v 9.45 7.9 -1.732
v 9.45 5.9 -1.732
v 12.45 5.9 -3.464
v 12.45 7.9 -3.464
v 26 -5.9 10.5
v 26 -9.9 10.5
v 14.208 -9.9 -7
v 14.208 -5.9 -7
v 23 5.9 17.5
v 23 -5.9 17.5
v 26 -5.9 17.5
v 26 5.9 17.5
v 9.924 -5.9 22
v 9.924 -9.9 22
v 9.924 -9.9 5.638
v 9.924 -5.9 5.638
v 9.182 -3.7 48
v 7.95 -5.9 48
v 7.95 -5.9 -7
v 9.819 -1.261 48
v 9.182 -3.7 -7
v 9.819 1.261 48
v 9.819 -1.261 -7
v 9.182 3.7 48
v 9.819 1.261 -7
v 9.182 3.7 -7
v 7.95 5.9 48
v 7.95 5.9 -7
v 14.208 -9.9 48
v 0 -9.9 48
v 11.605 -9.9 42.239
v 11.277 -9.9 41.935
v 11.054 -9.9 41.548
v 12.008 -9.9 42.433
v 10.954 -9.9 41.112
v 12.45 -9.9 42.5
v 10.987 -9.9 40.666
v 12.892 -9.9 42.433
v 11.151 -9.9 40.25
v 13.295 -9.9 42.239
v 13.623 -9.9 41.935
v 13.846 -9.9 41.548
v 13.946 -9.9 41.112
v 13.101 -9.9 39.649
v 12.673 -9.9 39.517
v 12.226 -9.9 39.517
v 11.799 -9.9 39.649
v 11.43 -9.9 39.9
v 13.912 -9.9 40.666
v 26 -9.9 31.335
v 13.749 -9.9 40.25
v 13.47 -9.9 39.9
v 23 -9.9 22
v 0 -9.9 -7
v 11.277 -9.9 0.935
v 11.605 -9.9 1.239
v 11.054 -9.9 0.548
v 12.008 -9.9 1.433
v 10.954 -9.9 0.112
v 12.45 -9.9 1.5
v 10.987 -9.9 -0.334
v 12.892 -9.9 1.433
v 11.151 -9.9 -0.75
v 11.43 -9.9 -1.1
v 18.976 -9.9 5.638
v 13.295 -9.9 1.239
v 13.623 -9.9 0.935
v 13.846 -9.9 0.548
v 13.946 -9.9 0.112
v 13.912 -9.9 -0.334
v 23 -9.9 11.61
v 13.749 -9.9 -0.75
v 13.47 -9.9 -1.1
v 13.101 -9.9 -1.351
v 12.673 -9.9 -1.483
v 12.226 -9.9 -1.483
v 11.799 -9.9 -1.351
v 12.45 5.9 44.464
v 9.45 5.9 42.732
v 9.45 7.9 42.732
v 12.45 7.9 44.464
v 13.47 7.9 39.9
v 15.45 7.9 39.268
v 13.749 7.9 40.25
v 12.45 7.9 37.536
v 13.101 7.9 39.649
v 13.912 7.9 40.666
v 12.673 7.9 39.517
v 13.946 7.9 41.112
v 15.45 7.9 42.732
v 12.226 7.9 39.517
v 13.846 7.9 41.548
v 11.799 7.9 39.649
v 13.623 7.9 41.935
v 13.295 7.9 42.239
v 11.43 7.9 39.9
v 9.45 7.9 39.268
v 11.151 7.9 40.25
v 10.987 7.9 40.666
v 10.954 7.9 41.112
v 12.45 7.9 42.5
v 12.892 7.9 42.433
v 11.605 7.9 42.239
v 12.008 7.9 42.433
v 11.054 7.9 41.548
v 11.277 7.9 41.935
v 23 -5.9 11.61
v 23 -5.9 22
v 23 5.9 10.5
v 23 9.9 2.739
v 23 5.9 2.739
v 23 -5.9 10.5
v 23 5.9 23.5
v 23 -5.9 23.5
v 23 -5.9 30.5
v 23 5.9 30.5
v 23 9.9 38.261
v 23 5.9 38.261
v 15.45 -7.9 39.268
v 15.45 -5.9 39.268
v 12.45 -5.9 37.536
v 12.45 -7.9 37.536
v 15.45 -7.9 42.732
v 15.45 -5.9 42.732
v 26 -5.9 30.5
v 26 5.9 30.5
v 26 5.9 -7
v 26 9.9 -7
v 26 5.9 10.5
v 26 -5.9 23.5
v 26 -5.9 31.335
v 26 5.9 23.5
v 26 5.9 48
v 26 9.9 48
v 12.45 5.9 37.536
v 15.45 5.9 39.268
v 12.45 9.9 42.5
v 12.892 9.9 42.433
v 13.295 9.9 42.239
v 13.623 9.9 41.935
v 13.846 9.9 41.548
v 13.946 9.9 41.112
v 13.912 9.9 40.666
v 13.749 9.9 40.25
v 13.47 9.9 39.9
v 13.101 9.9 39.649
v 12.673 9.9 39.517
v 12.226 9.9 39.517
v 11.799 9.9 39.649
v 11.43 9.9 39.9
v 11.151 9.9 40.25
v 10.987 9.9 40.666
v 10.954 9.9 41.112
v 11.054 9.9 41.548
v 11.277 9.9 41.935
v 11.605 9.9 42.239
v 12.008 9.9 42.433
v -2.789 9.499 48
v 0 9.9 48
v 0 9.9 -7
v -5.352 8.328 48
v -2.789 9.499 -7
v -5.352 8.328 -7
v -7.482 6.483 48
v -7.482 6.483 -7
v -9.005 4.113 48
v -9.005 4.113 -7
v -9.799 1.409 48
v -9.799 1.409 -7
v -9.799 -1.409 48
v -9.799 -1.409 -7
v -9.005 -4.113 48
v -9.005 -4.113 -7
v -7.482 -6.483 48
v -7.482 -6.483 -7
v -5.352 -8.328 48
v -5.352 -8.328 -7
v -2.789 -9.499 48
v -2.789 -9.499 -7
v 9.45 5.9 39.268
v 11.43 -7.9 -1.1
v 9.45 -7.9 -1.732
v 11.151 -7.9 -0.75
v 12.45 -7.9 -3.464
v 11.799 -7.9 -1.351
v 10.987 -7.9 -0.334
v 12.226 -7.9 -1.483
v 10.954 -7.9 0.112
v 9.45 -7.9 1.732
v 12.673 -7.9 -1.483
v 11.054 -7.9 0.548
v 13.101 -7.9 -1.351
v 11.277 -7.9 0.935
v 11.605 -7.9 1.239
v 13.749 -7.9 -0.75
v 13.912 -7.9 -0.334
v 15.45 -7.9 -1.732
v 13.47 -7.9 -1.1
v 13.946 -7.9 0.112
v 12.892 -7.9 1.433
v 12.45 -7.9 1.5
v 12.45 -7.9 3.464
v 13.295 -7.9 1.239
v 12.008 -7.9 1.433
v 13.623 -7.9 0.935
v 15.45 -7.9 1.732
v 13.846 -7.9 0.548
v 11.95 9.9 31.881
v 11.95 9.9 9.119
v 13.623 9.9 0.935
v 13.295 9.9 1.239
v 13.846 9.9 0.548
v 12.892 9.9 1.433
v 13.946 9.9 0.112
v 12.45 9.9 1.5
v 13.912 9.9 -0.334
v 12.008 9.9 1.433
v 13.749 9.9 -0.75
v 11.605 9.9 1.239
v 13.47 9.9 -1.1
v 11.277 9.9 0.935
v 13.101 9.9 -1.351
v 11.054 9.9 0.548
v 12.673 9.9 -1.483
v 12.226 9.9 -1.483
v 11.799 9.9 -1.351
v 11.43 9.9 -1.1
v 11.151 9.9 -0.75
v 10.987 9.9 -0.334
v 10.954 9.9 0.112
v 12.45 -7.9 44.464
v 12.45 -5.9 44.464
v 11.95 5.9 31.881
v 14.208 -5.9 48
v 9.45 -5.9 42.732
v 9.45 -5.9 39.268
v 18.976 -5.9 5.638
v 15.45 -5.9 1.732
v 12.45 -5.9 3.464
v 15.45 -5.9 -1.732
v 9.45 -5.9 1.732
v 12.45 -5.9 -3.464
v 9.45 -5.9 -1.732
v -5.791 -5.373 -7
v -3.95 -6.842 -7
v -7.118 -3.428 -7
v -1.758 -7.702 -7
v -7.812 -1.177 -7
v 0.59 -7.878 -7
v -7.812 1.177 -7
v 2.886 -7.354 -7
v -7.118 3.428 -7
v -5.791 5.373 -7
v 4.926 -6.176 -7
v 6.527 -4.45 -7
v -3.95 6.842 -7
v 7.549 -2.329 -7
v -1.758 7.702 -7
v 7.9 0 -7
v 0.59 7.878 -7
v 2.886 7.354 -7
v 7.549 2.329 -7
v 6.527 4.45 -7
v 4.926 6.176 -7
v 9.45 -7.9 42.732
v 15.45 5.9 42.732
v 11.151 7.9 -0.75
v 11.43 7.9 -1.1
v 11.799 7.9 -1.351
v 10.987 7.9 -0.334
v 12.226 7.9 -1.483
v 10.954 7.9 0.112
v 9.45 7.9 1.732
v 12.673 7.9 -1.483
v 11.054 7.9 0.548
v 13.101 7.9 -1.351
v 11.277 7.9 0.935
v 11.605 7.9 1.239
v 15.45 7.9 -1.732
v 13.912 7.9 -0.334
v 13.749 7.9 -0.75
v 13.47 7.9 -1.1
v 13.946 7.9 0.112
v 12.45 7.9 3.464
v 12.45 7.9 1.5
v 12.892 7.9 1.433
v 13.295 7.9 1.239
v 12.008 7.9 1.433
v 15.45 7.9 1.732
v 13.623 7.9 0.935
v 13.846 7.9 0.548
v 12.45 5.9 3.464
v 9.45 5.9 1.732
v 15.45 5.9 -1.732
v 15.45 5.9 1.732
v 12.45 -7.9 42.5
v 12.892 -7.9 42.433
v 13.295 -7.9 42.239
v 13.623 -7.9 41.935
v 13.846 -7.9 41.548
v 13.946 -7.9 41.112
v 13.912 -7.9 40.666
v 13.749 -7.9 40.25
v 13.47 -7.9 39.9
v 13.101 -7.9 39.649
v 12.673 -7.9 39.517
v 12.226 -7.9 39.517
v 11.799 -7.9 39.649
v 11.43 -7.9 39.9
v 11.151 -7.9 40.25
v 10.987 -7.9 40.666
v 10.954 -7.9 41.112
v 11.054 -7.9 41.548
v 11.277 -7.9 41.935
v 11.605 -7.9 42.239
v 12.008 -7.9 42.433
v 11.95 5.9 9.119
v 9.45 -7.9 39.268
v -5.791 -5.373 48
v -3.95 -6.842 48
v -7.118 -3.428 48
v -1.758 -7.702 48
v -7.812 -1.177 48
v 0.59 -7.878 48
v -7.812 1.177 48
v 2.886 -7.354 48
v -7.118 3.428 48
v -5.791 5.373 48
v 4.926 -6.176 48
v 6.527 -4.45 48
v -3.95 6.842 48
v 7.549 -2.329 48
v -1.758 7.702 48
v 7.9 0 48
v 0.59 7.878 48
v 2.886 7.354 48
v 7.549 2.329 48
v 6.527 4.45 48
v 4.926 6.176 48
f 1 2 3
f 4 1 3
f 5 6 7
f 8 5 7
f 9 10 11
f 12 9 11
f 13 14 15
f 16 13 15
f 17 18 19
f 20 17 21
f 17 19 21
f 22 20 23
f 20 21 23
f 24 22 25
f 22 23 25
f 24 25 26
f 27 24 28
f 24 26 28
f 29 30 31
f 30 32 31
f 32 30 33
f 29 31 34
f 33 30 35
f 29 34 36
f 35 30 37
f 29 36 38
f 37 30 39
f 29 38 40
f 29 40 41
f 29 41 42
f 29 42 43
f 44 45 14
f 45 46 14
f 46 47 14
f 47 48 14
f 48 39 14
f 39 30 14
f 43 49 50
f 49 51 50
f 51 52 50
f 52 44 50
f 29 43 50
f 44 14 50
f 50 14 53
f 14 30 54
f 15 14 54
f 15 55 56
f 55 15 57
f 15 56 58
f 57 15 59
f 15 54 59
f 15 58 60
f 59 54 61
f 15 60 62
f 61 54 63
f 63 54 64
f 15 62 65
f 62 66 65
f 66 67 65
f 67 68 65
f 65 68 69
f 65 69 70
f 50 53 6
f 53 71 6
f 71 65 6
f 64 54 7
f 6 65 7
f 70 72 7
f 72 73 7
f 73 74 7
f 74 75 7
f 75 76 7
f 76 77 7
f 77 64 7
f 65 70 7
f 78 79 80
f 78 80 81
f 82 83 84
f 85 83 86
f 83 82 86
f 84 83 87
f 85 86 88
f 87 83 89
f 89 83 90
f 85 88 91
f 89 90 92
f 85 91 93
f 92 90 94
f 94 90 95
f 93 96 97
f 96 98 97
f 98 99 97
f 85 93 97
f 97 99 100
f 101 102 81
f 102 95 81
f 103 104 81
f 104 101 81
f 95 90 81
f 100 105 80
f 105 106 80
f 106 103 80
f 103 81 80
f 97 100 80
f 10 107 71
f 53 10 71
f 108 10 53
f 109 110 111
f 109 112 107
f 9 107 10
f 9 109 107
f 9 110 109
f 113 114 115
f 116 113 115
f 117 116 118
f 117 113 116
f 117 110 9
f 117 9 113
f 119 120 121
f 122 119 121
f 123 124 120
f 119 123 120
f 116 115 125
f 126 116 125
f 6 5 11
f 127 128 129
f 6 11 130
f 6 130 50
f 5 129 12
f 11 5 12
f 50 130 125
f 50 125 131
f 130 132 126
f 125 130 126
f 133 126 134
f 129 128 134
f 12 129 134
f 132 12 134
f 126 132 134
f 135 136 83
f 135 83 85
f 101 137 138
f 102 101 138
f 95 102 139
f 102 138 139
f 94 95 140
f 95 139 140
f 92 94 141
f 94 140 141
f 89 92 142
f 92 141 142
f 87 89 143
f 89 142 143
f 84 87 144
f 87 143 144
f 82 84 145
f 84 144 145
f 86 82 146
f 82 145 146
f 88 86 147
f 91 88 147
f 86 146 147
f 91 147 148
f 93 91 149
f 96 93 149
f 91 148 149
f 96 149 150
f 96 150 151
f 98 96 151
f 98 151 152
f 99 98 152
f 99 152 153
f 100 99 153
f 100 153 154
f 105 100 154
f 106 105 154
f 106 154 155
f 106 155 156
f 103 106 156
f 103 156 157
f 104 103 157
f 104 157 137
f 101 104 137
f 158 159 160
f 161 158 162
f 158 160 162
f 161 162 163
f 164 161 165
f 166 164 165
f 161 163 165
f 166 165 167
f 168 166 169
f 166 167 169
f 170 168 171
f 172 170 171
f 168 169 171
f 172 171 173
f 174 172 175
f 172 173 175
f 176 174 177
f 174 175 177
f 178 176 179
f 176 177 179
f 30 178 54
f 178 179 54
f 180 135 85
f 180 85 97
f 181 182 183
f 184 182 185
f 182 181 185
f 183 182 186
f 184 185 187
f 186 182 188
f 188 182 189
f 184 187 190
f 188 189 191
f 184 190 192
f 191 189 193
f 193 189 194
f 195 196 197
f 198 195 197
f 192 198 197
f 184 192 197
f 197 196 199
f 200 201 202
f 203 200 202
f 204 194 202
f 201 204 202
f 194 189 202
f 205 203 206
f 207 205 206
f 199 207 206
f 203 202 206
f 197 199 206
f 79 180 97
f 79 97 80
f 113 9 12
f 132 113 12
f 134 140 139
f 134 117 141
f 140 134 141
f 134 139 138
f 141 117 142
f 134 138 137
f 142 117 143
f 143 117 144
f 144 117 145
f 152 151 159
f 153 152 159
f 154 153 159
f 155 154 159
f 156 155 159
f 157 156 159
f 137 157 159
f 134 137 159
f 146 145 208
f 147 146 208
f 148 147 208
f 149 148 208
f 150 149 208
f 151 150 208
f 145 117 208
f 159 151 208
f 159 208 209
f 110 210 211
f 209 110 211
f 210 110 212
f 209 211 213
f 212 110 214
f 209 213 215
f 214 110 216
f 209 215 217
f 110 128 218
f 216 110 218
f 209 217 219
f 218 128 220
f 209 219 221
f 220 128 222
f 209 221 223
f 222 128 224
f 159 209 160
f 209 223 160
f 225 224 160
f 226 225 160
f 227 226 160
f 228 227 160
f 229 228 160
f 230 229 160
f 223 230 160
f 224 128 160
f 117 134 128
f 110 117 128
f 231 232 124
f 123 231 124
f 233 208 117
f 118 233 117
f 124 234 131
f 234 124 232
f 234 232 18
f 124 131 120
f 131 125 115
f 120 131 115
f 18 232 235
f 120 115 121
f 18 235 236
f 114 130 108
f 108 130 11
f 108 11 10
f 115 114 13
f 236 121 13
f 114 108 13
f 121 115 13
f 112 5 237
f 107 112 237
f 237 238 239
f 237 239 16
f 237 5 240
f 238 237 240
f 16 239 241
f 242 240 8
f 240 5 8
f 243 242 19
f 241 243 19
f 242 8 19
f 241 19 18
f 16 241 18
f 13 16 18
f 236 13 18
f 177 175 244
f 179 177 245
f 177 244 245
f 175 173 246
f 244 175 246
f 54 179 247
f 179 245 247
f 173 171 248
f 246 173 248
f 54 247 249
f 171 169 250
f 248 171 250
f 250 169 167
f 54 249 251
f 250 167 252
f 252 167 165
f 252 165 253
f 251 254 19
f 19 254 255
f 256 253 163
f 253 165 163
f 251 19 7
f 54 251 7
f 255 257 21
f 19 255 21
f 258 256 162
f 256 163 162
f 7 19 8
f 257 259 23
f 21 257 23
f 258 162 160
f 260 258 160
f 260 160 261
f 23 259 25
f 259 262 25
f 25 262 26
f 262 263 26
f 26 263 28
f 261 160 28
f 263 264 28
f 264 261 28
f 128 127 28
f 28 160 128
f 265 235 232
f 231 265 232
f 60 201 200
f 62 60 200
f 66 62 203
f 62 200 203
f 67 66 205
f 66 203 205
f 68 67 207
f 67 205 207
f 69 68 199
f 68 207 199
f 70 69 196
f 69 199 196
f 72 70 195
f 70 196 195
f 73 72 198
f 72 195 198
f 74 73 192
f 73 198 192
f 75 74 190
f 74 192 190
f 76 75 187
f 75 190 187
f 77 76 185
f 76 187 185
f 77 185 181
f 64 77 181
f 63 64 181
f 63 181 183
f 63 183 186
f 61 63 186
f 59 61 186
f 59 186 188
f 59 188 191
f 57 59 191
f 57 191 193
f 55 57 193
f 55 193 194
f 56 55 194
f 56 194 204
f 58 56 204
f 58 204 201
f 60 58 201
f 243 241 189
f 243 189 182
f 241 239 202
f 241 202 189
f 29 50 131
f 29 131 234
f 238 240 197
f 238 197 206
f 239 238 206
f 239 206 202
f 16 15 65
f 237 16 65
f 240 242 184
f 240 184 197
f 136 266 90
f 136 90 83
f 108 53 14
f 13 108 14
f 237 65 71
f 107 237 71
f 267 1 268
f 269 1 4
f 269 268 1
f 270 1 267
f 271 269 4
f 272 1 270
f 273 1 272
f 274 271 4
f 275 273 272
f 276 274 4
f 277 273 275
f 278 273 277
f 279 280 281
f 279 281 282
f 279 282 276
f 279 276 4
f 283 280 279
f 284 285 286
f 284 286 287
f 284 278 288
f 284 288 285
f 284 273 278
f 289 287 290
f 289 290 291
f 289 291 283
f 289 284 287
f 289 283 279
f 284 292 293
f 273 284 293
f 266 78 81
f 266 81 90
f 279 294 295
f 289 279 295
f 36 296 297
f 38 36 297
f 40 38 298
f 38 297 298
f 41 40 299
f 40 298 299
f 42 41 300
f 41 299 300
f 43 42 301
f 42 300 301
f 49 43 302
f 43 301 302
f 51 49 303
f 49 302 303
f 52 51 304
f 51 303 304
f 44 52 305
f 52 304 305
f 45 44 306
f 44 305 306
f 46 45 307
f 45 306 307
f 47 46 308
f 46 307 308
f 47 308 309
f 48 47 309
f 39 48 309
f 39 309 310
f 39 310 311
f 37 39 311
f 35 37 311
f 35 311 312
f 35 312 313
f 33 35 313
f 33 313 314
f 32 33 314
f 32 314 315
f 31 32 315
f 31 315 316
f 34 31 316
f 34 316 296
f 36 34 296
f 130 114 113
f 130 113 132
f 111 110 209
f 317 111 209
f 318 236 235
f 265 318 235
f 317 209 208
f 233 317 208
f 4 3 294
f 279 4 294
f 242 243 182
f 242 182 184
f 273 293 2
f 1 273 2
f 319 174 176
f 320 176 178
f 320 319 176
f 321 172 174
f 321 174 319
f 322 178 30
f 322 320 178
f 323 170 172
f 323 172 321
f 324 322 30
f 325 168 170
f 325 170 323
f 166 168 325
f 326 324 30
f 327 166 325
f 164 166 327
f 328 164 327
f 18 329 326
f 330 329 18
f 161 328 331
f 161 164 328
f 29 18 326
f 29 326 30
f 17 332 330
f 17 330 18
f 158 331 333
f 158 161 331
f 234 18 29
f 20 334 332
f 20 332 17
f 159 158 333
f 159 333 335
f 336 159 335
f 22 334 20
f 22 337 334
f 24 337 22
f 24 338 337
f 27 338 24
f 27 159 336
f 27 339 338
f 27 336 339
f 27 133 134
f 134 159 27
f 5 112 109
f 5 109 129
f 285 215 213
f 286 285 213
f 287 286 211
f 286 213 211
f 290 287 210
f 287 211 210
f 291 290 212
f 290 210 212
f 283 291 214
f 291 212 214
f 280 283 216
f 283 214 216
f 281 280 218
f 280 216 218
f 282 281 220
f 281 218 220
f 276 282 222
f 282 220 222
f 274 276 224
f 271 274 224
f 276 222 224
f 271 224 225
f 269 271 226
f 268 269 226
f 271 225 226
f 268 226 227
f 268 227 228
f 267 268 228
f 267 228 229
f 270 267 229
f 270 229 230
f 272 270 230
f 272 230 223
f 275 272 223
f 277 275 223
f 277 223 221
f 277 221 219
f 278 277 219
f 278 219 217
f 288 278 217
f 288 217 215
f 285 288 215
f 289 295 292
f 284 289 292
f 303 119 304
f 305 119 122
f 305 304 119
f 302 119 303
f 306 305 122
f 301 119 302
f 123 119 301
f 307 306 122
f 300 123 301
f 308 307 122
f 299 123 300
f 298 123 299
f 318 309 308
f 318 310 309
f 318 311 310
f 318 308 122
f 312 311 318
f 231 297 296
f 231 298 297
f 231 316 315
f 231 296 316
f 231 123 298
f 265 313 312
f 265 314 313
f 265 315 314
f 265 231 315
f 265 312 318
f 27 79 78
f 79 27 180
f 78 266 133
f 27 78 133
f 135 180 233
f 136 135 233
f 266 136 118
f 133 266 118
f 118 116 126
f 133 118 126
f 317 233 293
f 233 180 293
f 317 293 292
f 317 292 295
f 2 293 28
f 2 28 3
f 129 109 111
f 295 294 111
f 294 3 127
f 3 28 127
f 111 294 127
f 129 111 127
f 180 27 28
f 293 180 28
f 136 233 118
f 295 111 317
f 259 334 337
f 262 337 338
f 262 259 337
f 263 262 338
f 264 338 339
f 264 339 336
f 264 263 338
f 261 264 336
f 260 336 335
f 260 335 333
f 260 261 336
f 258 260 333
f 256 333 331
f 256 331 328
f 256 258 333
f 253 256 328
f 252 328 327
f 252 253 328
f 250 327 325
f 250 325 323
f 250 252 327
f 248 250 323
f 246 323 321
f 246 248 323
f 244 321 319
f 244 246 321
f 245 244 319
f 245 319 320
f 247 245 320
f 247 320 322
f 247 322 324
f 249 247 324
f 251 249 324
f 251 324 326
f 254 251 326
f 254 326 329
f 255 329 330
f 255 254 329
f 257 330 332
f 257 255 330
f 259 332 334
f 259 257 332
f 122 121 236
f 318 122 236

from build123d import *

# Parameters (mm, degrees)
EXTRUDE_1_DEPTH      = 48
EXTRUDE_1_DEPTH_BACK = 7
SKETCH_2_R           = 9.9
SKETCH_2_R_2         = 7.9
CUT_EXTRUDE_1_DEPTH  = 2
SKETCH_4_R           = 1.5
CUT_EXTRUDE_2_DEPTH  = 28
CUT_EXTRUDE_3_DEPTH  = 10
SKETCH_7_W           = 3
SKETCH_7_H           = 7
EXTRUDE_3_DEPTH      = 12
CUT_EXTRUDE_4_DEPTH  = 10
CUT_EXTRUDE_START    = 11.8
CUT_EXTRUDE_7_DEPTH  = 2


with BuildPart() as part:
    # Эскиз2 → Бобышка-Вытянуть1 (new, two sides: drawn at the far end of the back side and taken through both)
    # profile 1 of 3: a face of its own
    with BuildSketch(Plane.XY.offset(-EXTRUDE_1_DEPTH_BACK)):
        Circle(SKETCH_2_R)
        Circle(SKETCH_2_R_2, mode=Mode.SUBTRACT)
    # profile 2 of 3: a face of its own
    with BuildSketch(Plane.XY.offset(-EXTRUDE_1_DEPTH_BACK)):
        with BuildLine():
            Line((26, 9.9), (0, 9.9))
            ThreePointArc((0, 9.9), (4.449719092, 8.843641784), (7.949842766, 5.9))
            Line((7.949842766, 5.9), (26, 5.9))
            Line((26, 5.9), (26, 9.9))
        make_face()
    # profile 3 of 3: a face of its own
    with BuildSketch(Plane.XY.offset(-EXTRUDE_1_DEPTH_BACK)):
        with BuildLine():
            ThreePointArc((7.949842766, -5.9), (4.449719092, -8.843641784), (0, -9.9))
            Line((0, -9.9), (26, -9.9))
            Line((26, -9.9), (26, -5.9))
            Line((26, -5.9), (7.949842766, -5.9))
        make_face()
    extrude(amount=EXTRUDE_1_DEPTH + EXTRUDE_1_DEPTH_BACK)

    # Эскиз3 → Вырез-Вытянуть1 (cut)
    with BuildSketch(Plane.XZ.offset(-5.9)):
        Polygon((15.449842766, -1.732050808), (15.449842766, 1.732050808), (12.449842766, 3.464101615), (9.449842766, 1.732050808), (9.449842766, -1.732050808), (12.449842766, -3.464101615), align=None)
        Polygon((12.449842766, 44.464101615), (15.449842766, 42.732050808), (15.449842766, 39.267949192), (12.449842766, 37.535898385), (9.449842766, 39.267949192), (9.449842766, 42.732050808), align=None)
    extrude(amount=-CUT_EXTRUDE_1_DEPTH, mode=Mode.SUBTRACT)

    # Эскиз4 → Вырез-Вытянуть2 (cut)
    with BuildSketch(Plane(origin=(0, 9.9, 0), x_dir=(1, 0, 0), z_dir=(0, 1, 0))):
        with Locations(Location((12.449842766, 0, 0), (0, 0, 270))):
            Circle(SKETCH_4_R)
        with Locations(Location((12.449842766, -41, 0), (0, 0, 270))):
            Circle(SKETCH_4_R)
    extrude(amount=-CUT_EXTRUDE_2_DEPTH, mode=Mode.SUBTRACT)

    # Эскиз5 → Вырез-Вытянуть3 (cut)
    with BuildSketch(Plane(origin=(0, 9.9, 0), x_dir=(1, 0, 0), z_dir=(0, 1, 0))):
        Polygon((23, -38.261238623), (23, -2.738761377), (11.949842766, -9.118572631), (11.949842766, -31.881427369), align=None)
    extrude(amount=-CUT_EXTRUDE_3_DEPTH, mode=Mode.SUBTRACT)

    # Эскиз7 → Бобышка-Вытянуть3 (add)
    with BuildSketch(Plane.XZ.offset(-5.9)):
        with Locations((24.5, 14)):
            Rectangle(SKETCH_7_W, SKETCH_7_H)
        with Locations((24.5, 27)):
            Rectangle(SKETCH_7_W, SKETCH_7_H)
    extrude(amount=EXTRUDE_3_DEPTH)

    # Эскиз8 → Вырез-Вытянуть4 (cut)
    with BuildSketch(Plane.XZ.offset(9.9)):
        Polygon((26, -7), (26, 10.5), (14.207826174, -7), align=None)
        Polygon((26, 48), (26, 31.334606818), (14.207826174, 48), align=None)
        Polygon((23, 22), (9.923665741, 22), (9.923665741, 5.63795963), (18.975811945, 5.63795963), (23, 11.609995999), align=None)
    extrude(amount=-CUT_EXTRUDE_4_DEPTH, mode=Mode.SUBTRACT)

    # Эскиз3<2> → Вырез-Вытянуть7 (cut)
    with BuildSketch(Plane.XZ.offset(-5.9).offset(CUT_EXTRUDE_START)):
        Polygon((15.449842766, 42.732050808), (15.449842766, 39.267949192), (12.449842766, 37.535898385), (9.449842766, 39.267949192), (9.449842766, 42.732050808), (12.449842766, 44.464101615), align=None)
        Polygon((9.449842766, -1.732050808), (12.449842766, -3.464101615), (15.449842766, -1.732050808), (15.449842766, 1.732050808), (12.449842766, 3.464101615), (9.449842766, 1.732050808), align=None)
    extrude(amount=CUT_EXTRUDE_7_DEPTH, mode=Mode.SUBTRACT)


solid = part.part
